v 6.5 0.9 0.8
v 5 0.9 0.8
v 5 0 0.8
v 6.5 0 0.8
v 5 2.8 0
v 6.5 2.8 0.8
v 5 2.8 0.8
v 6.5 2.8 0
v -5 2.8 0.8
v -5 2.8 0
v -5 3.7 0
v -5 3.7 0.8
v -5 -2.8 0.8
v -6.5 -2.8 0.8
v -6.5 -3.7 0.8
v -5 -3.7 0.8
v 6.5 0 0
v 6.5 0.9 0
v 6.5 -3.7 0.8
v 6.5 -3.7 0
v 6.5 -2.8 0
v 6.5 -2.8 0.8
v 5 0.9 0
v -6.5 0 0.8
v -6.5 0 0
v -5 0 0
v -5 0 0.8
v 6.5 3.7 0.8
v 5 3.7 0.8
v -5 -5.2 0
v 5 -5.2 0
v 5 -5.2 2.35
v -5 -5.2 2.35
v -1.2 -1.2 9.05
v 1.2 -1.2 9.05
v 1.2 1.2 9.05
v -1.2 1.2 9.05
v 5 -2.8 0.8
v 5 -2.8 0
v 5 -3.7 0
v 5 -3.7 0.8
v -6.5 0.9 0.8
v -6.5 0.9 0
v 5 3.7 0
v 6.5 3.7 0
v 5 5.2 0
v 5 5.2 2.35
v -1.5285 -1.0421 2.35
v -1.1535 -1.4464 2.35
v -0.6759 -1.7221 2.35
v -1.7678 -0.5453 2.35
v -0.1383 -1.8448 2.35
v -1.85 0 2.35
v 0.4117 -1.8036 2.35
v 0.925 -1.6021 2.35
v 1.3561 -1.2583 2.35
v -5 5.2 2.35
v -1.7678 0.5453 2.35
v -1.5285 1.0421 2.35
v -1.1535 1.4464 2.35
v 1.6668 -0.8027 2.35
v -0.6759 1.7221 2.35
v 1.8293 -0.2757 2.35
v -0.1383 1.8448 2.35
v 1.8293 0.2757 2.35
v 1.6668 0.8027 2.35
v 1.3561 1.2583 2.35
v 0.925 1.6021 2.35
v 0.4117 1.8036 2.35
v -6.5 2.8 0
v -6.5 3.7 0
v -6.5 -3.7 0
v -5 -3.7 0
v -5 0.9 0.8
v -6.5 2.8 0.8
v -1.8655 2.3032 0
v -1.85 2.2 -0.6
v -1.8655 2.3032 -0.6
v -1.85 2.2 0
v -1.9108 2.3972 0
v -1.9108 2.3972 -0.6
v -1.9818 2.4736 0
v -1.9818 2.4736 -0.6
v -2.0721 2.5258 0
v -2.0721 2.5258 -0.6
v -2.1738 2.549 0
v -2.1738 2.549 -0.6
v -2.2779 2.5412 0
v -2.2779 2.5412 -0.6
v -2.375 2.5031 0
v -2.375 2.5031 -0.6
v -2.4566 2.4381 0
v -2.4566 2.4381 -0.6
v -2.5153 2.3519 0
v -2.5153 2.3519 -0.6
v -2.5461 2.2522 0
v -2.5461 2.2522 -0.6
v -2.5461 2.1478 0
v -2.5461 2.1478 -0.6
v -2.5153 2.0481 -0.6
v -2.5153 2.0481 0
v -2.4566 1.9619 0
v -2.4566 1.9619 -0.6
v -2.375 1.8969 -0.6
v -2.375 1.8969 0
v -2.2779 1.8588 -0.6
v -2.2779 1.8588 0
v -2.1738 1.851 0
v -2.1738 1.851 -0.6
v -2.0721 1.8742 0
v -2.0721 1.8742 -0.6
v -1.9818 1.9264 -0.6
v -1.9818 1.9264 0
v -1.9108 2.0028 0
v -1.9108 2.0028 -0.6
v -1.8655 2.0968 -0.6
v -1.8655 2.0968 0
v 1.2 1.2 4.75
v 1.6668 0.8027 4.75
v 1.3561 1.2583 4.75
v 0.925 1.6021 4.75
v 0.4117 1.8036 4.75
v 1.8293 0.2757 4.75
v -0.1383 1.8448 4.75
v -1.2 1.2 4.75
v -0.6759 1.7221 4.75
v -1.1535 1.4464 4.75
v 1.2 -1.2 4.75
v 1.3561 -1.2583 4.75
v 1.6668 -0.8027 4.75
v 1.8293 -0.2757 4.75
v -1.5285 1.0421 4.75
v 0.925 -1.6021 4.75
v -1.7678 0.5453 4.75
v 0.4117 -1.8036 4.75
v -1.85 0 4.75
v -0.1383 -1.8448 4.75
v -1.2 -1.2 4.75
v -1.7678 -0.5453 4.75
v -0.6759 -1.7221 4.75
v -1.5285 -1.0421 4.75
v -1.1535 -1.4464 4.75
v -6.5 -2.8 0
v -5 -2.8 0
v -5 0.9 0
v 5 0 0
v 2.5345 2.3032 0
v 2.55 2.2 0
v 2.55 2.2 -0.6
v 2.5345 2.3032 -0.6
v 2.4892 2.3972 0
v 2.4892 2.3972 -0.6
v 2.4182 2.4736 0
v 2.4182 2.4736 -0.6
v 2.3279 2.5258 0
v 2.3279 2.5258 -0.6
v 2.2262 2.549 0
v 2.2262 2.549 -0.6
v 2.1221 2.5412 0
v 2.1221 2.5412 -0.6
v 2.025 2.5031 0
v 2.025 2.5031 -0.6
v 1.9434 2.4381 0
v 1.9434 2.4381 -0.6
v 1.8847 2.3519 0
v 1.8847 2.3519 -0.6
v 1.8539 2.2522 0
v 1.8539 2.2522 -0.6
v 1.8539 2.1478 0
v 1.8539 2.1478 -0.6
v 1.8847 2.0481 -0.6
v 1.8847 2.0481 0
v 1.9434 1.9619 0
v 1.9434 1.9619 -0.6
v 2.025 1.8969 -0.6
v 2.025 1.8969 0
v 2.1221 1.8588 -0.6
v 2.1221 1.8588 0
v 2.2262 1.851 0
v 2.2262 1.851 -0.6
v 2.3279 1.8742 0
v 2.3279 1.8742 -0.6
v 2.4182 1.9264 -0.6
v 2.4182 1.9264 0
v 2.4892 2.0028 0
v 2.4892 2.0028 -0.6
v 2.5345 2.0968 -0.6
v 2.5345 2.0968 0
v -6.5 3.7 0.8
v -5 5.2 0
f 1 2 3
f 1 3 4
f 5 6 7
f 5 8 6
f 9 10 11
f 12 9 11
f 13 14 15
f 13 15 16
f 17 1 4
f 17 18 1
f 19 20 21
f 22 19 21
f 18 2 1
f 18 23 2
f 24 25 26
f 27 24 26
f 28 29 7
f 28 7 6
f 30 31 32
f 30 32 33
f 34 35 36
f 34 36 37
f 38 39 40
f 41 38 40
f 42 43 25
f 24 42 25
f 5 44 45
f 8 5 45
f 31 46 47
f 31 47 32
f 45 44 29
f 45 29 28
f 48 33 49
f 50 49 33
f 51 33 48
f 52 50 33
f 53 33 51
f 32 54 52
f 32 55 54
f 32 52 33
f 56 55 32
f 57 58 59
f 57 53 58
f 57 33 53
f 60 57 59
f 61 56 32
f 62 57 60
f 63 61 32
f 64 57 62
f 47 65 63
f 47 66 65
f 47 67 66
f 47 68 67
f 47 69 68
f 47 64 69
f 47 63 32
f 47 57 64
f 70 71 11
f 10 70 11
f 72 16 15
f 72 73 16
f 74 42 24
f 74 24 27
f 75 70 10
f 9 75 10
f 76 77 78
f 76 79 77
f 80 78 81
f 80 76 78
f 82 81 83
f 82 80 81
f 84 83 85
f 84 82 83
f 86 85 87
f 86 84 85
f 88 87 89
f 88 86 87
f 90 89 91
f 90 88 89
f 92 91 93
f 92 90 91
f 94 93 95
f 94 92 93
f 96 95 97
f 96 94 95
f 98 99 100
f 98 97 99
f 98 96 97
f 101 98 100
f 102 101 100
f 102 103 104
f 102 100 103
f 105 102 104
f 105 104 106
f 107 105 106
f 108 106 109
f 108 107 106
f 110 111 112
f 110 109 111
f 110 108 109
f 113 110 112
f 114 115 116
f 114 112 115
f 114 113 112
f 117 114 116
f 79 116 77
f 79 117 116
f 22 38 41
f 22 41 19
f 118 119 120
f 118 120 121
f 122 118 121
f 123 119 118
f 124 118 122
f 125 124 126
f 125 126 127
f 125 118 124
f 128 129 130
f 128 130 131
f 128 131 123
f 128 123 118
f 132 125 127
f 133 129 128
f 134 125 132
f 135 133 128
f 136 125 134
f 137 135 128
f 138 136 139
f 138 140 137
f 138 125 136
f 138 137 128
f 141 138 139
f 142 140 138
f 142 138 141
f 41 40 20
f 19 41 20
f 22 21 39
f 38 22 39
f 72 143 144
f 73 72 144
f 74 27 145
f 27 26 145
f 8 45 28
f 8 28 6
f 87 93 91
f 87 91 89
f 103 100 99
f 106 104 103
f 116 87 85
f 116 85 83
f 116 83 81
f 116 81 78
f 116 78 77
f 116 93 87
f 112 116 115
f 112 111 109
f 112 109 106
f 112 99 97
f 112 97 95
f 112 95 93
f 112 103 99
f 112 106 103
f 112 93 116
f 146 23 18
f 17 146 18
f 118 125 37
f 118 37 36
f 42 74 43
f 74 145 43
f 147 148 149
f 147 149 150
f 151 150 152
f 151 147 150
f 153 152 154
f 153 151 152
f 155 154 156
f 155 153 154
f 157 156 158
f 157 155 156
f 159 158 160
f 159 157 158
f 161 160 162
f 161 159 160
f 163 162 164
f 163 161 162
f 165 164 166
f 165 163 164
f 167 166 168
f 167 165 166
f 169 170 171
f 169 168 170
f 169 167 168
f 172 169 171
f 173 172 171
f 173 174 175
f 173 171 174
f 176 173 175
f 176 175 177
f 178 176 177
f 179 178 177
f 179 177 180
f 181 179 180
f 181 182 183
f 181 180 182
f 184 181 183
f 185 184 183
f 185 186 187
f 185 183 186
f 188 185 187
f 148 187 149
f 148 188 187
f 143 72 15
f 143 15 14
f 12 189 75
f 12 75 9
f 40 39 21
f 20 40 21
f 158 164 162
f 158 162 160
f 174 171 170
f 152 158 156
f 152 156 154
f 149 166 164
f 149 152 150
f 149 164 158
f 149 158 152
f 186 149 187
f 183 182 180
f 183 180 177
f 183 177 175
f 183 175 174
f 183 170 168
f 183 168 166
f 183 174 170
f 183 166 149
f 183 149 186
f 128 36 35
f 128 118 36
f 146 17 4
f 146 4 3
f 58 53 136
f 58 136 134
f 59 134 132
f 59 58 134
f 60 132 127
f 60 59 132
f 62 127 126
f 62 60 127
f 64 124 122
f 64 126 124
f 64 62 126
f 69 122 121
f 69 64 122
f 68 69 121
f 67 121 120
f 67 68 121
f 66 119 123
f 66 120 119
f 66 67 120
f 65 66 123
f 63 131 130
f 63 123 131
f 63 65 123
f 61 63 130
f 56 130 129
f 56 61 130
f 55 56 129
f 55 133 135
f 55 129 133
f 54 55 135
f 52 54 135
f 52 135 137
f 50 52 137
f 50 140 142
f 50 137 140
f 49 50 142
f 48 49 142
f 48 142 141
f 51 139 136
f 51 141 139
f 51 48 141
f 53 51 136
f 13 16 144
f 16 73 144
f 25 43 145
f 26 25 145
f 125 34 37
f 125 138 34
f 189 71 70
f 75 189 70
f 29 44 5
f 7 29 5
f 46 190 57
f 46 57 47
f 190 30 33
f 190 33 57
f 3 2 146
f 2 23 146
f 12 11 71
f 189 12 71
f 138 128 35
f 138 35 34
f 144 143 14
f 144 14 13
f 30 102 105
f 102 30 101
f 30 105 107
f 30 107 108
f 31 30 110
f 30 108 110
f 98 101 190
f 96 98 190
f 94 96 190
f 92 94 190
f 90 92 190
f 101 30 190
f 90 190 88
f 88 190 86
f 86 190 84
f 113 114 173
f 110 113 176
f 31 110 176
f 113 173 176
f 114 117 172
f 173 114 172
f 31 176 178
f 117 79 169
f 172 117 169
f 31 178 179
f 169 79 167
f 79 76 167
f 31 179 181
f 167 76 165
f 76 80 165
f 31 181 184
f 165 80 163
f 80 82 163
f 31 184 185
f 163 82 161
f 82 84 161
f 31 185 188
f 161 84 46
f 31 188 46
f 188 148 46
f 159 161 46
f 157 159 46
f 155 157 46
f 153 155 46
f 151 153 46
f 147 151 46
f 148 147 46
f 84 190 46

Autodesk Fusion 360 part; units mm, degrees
sketch "Sketch1" plane through (0, 0, 0) normal (0, 0, 1) x (1, 0, 0)
  line L0 (5, -5.2) -> (-5, -5.2)
  line L1 (-5, -5.2) -> (-5, 5.2)
  line L2 (-5, 5.2) -> (5, 5.2)
  line L3 (5, 5.2) -> (5, -5.2)
  line L4 (5, -5.2) -> (-5, 5.2) construction
  line L5 (-5, -5.2) -> (5, 5.2) construction
  line L6 (0, 0) -> (6.5, 0) construction
  line L7 (6.5, 0) -> (6.5, 5.2) construction
  line L8 (6.5, 0) -> (5, 0)
  line L9 (5, 0) -> (5, 0.9)
  line L10 (5, 0.9) -> (6.5, 0.9)
  line L11 (6.5, 0.9) -> (6.5, 0)
  line L12 (6.5, 0.45) -> (6.5, 3.25) construction
  line L13 (6.5, 3.25) -> (5, 3.25) construction
  line L14 (6.5, 2.8) -> (5, 2.8)
  line L15 (5, 2.8) -> (5, 3.7)
  line L16 (5, 3.7) -> (6.5, 3.7)
  line L17 (6.5, 3.7) -> (6.5, 2.8)
  line L18 (6.5, 2.8) -> (5, 3.7) construction
  line L19 (5, 2.8) -> (6.5, 3.7) construction
  line L20 (6.5, 0.45) -> (6.5, -3.25) construction
  line L21 (6.5, -3.25) -> (5, -3.25) construction
  line L22 (6.5, -2.8) -> (5, -2.8)
  line L23 (5, -2.8) -> (5, -3.7)
  line L24 (5, -3.7) -> (6.5, -3.7)
  line L25 (6.5, -3.7) -> (6.5, -2.8)
  line L26 (6.5, -2.8) -> (5, -3.7) construction
  line L27 (5, -2.8) -> (6.5, -3.7) construction
  line L28 (0, 2.5) -> (0, 20)
  line L29 (-5, 2.8) -> (-5, 3.7)
  line L30 (-6.5, 0.9) -> (-6.5, 0)
  line L31 (-6.5, -3.25) -> (-5, -3.25) construction
  line L32 (-6.5, -2.8) -> (-5, -3.7) construction
  line L33 (-6.5, 3.25) -> (-5, 3.25) construction
  line L34 (-6.5, 0) -> (-5, 0)
  line L35 (-6.5, 3.7) -> (-6.5, 2.8)
  line L36 (-5, -2.8) -> (-5, -3.7)
  line L37 (-5, -2.8) -> (-6.5, -3.7) construction
  line L38 (-6.5, -2.8) -> (-5, -2.8)
  line L39 (-6.5, 0.45) -> (-6.5, -3.25) construction
  line L40 (-5, 2.8) -> (-6.5, 3.7) construction
  line L41 (-6.5, 0.45) -> (-6.5, 3.25) construction
  line L42 (-5, 3.7) -> (-6.5, 3.7)
  line L43 (-5, 0.9) -> (-6.5, 0.9)
  line L44 (-6.5, 2.8) -> (-5, 2.8)
  line L45 (-5, 0) -> (-5, 0.9)
  line L46 (-6.5, -3.7) -> (-6.5, -2.8)
  line L47 (-5, -3.7) -> (-6.5, -3.7)
  line L48 (-6.5, 2.8) -> (-5, 3.7) construction
  point P0 (5.75, 3.25)
  point P1 (5.75, -3.25)
  point P2 (-5.75, -3.25)
  point P3 (-5.75, 3.25)
  dimension "d1" = 10
  dimension "d2" = 10.4
  dimension "d3" = 6.5
  dimension "d4" = 0.9
  dimension "d5" = 2.8
  dimension "d6" = 0.9
  dimension "d7" = 3.7
  dimension "d8" = 0.9
extrude "Extrude1" add sketch "Sketch1" along normal blind 2.35 contours L0 L1 L2 L3 L9 L15 L23 L29 L36 L45 makes body 1
extrude "Extrude2" add sketch "Sketch1" along normal blind 0.8 separate body contours L3 L22 L23 L24 L25 | L1 L36 L38 L46 L47 | L3 L8 L9 L10 L11 | L1 L30 L34 L43 L45 | L3 L14 L15 L16 L17 | L1 L29 L35 L42 L44 makes body 2 at (-5.5, 3.1, 0) makes body 3 at (6, 3.4, 0) makes body 4 at (-5.5, 0.3, 0) makes body 5 at (5.5, -3.1, 0) makes body 6 at (5.5, 0.6, 0) makes body 7 at (-6, -3.4, 0)
sketch "Sketch2" plane through (0, 0, 2.35) normal (0, 0, 1) x (-1, 0, 0)
  line L0 (5, -5.2) -> (5, 5.2)
  line L1 (5, 5.2) -> (-5, 5.2)
  line L2 (-5, 5.2) -> (-5, -5.2)
  line L3 (-5, -5.2) -> (5, -5.2)
  circle A0 centre (0, 0) radius 1.85
  line L4 (-1.2, 1.2) -> (1.2, 1.2)
  line L5 (1.2, 1.2) -> (1.2, -1.2)
  line L6 (1.2, -1.2) -> (-1.2, -1.2)
  line L7 (-1.2, -1.2) -> (-1.2, 1.2)
  line L8 (-1.2, 1.2) -> (1.2, -1.2) construction
  line L9 (1.2, 1.2) -> (-1.2, -1.2) construction
  dimension "d13" = 3.7
  dimension "d14" = 2.4
  dimension "d15" = 2.4
extrude "Extrude3" add sketch "Sketch2" along normal blind 6.7 contours L4 L5 L6 L7 bodies 1
extrude "Extrude4" add sketch "Sketch2" along normal blind 2.4 contours A0 bodies 1
sketch "Sketch3" plane through (0, 0, 0) normal (0, 0, -1) x (1, 0, 0)
  line L0 (-5, 5.2) -> (-5, -5.2)
  line L1 (-5, -5.2) -> (5, -5.2)
  line L2 (5, -5.2) -> (5, 5.2)
  line L3 (5, 5.2) -> (-5, 5.2)
  line L4 (-1.2, -1.2) -> (-1.2, 1.2) construction
  line L5 (0, 0) -> (-2.2, 0) construction
  line L6 (-2.2, 0) -> (-2.2, -2.2) construction
  line L7 (-2.2, -2.2) -> (2.2, -2.2) construction
  circle A0 centre (2.2, -2.2) radius 0.35
  circle A1 centre (-2.2, -2.2) radius 0.35
  dimension "d20" = 2.2
  dimension "d21" = 2.2
  dimension "d22" = 4.4
  dimension "d23" = 0.7
  dimension "d24" = 0.7
extrude "Extrude5" add sketch "Sketch3" along normal blind 0.6 contours A0 | A1 bodies 1
